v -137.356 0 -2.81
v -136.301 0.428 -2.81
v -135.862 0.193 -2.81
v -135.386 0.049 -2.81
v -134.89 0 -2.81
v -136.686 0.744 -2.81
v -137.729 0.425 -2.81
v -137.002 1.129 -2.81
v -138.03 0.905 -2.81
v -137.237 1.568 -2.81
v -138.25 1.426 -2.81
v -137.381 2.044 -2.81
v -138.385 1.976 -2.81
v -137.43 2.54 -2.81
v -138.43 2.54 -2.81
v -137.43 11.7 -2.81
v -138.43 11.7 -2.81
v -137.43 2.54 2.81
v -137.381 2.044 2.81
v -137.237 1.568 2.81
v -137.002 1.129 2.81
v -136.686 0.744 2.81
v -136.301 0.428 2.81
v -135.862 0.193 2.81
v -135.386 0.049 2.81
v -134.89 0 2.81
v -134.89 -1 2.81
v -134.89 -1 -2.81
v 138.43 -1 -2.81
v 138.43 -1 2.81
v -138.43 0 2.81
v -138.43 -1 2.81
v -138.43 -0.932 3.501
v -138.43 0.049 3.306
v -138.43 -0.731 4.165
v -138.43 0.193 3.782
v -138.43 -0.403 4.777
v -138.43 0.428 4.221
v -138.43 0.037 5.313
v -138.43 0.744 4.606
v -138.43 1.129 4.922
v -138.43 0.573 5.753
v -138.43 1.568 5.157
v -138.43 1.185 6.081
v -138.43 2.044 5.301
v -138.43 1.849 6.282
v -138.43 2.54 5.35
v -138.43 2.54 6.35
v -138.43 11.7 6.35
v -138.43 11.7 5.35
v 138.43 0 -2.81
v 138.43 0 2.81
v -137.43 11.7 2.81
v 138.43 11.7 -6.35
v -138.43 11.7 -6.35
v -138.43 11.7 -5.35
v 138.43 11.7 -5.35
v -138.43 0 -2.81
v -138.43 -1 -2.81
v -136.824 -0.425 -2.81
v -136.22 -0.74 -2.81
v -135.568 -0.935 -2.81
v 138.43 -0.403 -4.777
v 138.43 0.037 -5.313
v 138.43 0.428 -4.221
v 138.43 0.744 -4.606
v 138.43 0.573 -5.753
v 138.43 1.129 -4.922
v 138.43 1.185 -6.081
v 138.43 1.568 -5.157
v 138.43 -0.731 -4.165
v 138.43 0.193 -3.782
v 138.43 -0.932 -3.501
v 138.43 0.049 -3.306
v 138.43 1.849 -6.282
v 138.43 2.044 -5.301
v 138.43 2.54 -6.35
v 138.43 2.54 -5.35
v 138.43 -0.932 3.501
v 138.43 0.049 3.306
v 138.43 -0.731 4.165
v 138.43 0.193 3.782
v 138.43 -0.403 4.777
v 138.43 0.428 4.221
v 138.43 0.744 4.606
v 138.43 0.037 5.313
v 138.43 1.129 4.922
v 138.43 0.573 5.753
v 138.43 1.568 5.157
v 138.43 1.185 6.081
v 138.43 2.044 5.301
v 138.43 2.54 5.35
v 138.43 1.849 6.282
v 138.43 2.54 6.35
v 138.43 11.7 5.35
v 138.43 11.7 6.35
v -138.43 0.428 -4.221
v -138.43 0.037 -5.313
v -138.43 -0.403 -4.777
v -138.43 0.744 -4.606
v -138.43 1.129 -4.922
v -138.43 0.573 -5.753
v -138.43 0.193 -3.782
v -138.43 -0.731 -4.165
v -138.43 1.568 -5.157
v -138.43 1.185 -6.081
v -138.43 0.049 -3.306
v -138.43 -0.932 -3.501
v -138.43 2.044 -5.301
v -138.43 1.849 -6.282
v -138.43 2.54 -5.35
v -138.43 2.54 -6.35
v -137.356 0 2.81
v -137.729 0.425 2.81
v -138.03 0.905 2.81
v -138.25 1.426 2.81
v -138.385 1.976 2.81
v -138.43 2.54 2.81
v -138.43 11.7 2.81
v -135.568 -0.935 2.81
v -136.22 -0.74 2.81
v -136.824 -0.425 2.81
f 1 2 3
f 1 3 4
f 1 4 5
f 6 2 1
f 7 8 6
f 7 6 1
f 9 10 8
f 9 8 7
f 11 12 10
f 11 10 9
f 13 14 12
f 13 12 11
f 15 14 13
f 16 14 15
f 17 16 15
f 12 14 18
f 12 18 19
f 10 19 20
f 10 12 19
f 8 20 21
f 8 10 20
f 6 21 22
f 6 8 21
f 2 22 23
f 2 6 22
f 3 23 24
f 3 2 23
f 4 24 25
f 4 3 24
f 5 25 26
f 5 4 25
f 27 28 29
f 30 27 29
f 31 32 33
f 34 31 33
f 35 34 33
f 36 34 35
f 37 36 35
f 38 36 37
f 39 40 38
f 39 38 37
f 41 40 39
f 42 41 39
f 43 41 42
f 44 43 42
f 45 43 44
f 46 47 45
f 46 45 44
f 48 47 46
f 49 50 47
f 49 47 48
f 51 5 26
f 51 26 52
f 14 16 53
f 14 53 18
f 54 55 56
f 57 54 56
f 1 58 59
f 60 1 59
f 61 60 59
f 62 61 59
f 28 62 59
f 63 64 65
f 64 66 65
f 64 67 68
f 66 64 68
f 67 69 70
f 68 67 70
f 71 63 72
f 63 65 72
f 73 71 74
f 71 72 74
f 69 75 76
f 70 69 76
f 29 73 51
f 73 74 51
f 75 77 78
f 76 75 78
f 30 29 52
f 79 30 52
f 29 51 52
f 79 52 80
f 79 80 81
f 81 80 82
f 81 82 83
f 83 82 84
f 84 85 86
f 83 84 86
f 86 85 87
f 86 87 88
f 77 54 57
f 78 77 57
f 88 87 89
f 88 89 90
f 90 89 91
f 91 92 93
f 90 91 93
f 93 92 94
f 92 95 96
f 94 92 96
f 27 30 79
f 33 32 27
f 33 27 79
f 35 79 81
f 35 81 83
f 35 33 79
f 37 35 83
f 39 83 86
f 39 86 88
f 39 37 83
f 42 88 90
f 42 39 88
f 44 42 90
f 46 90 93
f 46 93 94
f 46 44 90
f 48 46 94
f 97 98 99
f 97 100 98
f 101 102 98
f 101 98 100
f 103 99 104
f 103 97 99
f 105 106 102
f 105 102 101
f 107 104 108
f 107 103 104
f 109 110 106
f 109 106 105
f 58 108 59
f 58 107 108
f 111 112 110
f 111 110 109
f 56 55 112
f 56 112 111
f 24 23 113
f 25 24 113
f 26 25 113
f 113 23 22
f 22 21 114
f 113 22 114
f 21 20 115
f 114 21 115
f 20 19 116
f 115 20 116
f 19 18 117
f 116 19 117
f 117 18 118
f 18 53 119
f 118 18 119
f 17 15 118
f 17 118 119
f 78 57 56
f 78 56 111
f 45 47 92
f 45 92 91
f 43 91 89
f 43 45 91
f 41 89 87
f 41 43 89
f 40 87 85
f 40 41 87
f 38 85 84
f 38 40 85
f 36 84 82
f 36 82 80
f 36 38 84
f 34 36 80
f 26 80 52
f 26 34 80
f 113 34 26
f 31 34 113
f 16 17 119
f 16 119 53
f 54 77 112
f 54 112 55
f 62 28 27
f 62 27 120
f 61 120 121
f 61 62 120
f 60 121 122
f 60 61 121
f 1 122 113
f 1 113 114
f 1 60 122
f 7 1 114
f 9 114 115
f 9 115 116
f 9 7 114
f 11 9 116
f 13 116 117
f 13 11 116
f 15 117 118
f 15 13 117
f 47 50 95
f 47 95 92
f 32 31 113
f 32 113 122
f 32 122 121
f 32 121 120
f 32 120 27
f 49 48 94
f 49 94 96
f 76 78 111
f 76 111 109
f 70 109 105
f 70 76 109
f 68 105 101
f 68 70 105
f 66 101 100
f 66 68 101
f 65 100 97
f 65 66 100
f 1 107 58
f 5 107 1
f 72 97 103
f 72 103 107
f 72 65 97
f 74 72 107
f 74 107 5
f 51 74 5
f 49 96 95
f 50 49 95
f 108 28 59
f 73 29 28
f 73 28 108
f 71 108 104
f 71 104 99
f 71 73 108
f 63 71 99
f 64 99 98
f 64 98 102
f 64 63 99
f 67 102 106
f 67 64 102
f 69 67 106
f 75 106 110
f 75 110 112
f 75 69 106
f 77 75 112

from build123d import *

# Parameters (mm, degrees)
SKETCH10_W                   = 276.86
SKETCH10_H                   = 12.7
BASE_FLANGE1_DEPTH           = 1
EDGE_FLANGE1_STRIP_W         = 9.08
EDGE_FLANGE1_STRIP_H         = 1
EDGE_FLANGE1_STRIP_CUT_DEPTH = 276.86
EDGE_FLANGE1_DEPTH           = 276.86
EDGE_FLANGE2_STRIP_W         = 9.08
EDGE_FLANGE2_STRIP_H         = 1
EDGE_FLANGE2_STRIP_CUT_DEPTH = 276.86
EDGE_FLANGE2_DEPTH           = 276.86
EDGE_FLANGE3_STRIP_W         = 9.08
EDGE_FLANGE3_STRIP_H         = 1
EDGE_FLANGE3_STRIP_CUT_DEPTH = 5.62
EDGE_FLANGE3_DEPTH           = 5.62


# Sheet-metal steps are written as plain solids
with BuildPart() as part:
    # Sketch10 → Base-Flange1 (new body)
    with BuildSketch(Plane(origin=(0, 0, 0), x_dir=(1, 0, 0), z_dir=(0, 1, 0))):
        Rectangle(SKETCH10_W, SKETCH10_H)
    extrude(amount=-BASE_FLANGE1_DEPTH)

    # Edge-Flange1 strip (across the edge) → Edge-Flange1 strip cut (cut)
    with BuildSketch(Plane(origin=(138.43, 0, -6.35), x_dir=(0, 0, 1), z_dir=(-1, 0, 0))):
        with Locations((-1, -0.5)):
            Rectangle(EDGE_FLANGE1_STRIP_W, EDGE_FLANGE1_STRIP_H)
    extrude(amount=EDGE_FLANGE1_STRIP_CUT_DEPTH, mode=Mode.SUBTRACT)

    # Edge-Flange1 section (across the edge) → Edge-Flange1 (add)
    with BuildSketch(Plane(origin=(138.43, 0, -6.35), x_dir=(0, 0, 1), z_dir=(-1, 0, 0))):
        with BuildLine():
            Line((0, 2.54), (0, 11.7))
            Line((0, 11.7), (1, 11.7))
            Line((1, 11.7), (1, 2.54))
            ThreePointArc((1, 2.54), (1.743948776, 0.743948776), (3.54, 0))
            Line((3.54, 0), (3.54, -1))
            ThreePointArc((3.54, -1), (1.036841995, 0.036841995), (0, 2.54))
        make_face()
    extrude(amount=EDGE_FLANGE1_DEPTH)

    # Edge-Flange2 strip (across the edge) → Edge-Flange2 strip cut (cut)
    with BuildSketch(Plane(origin=(-138.43, 0, 6.35), x_dir=(0, 0, -1), z_dir=(1, 0, 0))):
        with Locations((-1, -0.5)):
            Rectangle(EDGE_FLANGE2_STRIP_W, EDGE_FLANGE2_STRIP_H)
    extrude(amount=EDGE_FLANGE2_STRIP_CUT_DEPTH, mode=Mode.SUBTRACT)

    # Edge-Flange2 section (across the edge) → Edge-Flange2 (add)
    with BuildSketch(Plane(origin=(-138.43, 0, 6.35), x_dir=(0, 0, -1), z_dir=(1, 0, 0))):
        with BuildLine():
            Line((0, 2.54), (0, 11.7))
            Line((0, 11.7), (1, 11.7))
            Line((1, 11.7), (1, 2.54))
            ThreePointArc((1, 2.54), (1.743948776, 0.743948776), (3.54, 0))
            Line((3.54, 0), (3.54, -1))
            ThreePointArc((3.54, -1), (1.036841995, 0.036841995), (0, 2.54))
        make_face()
    extrude(amount=EDGE_FLANGE2_DEPTH)

    # Edge-Flange3 strip (across the edge) → Edge-Flange3 strip cut (cut)
    with BuildSketch(Plane(origin=(-138.43, 0, -2.81), x_dir=(1, 0, 0), z_dir=(0, 0, 1))):
        with Locations((-1, -0.5)):
            Rectangle(EDGE_FLANGE3_STRIP_W, EDGE_FLANGE3_STRIP_H)
    extrude(amount=EDGE_FLANGE3_STRIP_CUT_DEPTH, mode=Mode.SUBTRACT)

    # Edge-Flange3 section (across the edge) → Edge-Flange3 (add)
    with BuildSketch(Plane(origin=(-138.43, 0, -2.81), x_dir=(1, 0, 0), z_dir=(0, 0, 1))):
        with BuildLine():
            Line((0, 2.54), (0, 11.7))
            Line((0, 11.7), (1, 11.7))
            Line((1, 11.7), (1, 2.54))
            ThreePointArc((1, 2.54), (1.743948776, 0.743948776), (3.54, 0))
            Line((3.54, 0), (3.54, -1))
            ThreePointArc((3.54, -1), (1.036841995, 0.036841995), (0, 2.54))
        make_face()
    extrude(amount=EDGE_FLANGE3_DEPTH)


solid = part.part
